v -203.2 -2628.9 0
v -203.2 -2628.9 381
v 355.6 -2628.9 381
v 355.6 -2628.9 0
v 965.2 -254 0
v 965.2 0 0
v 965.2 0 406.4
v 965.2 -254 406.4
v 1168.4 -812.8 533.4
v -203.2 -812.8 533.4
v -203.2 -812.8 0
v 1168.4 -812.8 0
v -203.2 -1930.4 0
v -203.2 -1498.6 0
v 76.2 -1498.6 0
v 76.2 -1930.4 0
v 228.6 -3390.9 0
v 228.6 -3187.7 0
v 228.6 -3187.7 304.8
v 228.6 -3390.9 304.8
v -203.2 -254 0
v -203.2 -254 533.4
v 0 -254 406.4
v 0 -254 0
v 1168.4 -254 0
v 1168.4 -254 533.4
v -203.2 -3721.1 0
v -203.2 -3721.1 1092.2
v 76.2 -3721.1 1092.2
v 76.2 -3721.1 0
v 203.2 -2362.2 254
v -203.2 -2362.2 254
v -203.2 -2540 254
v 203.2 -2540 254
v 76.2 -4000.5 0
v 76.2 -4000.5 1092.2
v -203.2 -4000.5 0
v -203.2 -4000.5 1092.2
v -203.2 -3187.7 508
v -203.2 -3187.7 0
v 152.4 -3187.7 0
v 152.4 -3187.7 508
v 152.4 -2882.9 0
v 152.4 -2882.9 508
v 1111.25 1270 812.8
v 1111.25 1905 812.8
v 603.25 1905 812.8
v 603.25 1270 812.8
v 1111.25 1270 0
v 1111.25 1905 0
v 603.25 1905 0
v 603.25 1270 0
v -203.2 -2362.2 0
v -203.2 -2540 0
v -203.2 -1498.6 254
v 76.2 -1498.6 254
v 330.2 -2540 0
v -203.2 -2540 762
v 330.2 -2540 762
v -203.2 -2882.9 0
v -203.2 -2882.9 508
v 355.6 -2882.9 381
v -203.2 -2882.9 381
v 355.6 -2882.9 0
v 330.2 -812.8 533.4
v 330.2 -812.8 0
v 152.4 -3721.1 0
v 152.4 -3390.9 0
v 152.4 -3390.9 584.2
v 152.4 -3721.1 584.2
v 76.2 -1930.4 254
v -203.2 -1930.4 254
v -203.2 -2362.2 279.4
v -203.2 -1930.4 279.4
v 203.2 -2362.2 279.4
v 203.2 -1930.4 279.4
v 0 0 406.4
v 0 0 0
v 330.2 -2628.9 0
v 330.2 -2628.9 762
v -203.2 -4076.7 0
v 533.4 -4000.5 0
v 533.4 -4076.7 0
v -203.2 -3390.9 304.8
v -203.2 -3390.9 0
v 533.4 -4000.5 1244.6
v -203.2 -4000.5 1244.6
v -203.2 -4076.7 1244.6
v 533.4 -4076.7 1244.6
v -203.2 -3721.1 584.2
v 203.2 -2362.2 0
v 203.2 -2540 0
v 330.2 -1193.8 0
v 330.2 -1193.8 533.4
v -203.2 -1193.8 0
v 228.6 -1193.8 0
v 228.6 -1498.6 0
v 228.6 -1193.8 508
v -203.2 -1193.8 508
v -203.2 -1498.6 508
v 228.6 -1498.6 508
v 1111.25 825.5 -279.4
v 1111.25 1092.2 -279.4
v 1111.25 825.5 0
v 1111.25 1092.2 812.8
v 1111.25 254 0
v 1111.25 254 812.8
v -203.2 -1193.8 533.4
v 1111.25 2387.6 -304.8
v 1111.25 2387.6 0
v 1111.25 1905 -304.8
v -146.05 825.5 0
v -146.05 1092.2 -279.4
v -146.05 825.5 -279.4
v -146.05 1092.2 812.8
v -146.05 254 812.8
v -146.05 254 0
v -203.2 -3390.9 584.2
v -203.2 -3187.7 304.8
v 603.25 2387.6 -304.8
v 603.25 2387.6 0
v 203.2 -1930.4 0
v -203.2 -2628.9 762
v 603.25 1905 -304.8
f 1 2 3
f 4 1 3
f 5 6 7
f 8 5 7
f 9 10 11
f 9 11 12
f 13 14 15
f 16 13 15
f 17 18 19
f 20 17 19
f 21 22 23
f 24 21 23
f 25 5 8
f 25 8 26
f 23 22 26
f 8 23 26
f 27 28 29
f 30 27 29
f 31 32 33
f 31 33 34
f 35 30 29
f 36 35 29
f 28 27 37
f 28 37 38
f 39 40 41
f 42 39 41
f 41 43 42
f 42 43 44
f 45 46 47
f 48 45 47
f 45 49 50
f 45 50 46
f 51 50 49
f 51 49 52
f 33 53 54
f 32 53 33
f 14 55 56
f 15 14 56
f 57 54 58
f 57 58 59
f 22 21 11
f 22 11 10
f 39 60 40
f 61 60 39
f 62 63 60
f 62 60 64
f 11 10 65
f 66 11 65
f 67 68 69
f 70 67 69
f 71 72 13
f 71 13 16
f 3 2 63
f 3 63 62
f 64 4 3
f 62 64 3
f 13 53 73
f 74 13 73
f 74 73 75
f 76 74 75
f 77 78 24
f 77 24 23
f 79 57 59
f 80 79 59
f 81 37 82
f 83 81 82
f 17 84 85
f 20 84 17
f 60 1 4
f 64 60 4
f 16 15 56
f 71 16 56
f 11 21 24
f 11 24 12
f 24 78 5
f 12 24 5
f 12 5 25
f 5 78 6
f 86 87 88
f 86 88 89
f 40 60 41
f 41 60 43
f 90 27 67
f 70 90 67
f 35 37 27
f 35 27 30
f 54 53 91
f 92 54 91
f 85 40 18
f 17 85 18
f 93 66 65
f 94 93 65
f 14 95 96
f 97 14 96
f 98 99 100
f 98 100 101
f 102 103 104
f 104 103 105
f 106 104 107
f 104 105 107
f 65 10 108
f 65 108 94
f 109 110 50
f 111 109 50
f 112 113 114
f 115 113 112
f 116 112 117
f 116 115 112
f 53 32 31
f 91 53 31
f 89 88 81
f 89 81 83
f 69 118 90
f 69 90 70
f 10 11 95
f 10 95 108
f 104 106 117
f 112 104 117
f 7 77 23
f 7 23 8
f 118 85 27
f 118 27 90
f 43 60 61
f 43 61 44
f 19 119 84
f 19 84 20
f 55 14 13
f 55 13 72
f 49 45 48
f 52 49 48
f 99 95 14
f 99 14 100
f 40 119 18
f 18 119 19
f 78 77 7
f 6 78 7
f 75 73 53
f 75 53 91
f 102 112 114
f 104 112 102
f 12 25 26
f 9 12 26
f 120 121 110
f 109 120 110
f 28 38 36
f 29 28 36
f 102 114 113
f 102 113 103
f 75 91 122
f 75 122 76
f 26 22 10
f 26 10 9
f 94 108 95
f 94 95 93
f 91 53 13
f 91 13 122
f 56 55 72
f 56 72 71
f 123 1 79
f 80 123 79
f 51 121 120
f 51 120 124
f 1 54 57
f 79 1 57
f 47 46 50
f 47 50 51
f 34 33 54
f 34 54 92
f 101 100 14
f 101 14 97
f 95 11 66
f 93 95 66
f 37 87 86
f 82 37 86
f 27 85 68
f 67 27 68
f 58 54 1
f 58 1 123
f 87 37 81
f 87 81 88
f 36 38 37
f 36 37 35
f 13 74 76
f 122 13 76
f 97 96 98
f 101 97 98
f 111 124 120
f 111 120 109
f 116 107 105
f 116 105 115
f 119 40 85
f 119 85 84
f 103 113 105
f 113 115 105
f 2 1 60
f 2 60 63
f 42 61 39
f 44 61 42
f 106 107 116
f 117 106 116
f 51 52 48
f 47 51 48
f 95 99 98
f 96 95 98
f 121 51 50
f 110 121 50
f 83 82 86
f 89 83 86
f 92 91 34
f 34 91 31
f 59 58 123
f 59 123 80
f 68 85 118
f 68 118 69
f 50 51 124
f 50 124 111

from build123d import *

# Parameters (mm, degrees)
F0_W      = 965.2
F0_H      = 406.4
F1_DEPTH  = 254
F2_W      = 1371.6
F2_H      = 533.4
F3_DEPTH  = 558.8
F5_W      = 1257.3
F5_H      = 812.8
F6_DEPTH  = 838.2
F7_W      = 1257.3
F7_H      = 266.7
F8_DEPTH  = 279.4
F10_W     = 508
F10_H     = 812.8
F11_DEPTH = 635
F12_W     = 508
F12_H     = 482.6
F13_DEPTH = 304.8
F14_W     = 533.4
F14_H     = 533.4
F15_DEPTH = 381
F16_W     = 431.8
F16_H     = 508
F17_DEPTH = 304.8
F18_W     = 279.4
F18_H     = 254
F19_DEPTH = 431.8
F20_W     = 406.4
F20_H     = 279.4
F21_DEPTH = 431.8
F22_W     = 406.4
F22_H     = 254
F23_DEPTH = 177.8
F24_W     = 533.4
F24_H     = 762
F25_DEPTH = 88.9
F26_W     = 558.8
F26_H     = 381
F27_DEPTH = 254
F28_W     = 355.6
F28_H     = 508
F29_DEPTH = 304.8
F30_W     = 431.8
F30_H     = 304.8
F31_DEPTH = 203.2
F32_W     = 355.6
F32_H     = 584.2
F33_DEPTH = 330.2
F34_W     = 279.4
F34_H     = 1092.2
F35_DEPTH = 279.4
F36_W     = 736.6
F36_H     = 1244.6
F37_DEPTH = 76.2


with BuildPart() as f1:
    # F0 (on Front) → F1 (new body)
    with BuildSketch(Plane.XZ):
        with Locations((482.6, 203.2)):
            Rectangle(F0_W, F0_H)
    extrude(amount=F1_DEPTH)

    # F2 (on face) → F3 (join)
    with BuildSketch(Plane.XZ.offset(254)):
        with Locations((482.6, 266.7)):
            Rectangle(F2_W, F2_H)
    extrude(amount=F3_DEPTH)


with BuildPart() as f6:
    # F5 (on offset) → F6 (new body)
    with BuildSketch(Plane(origin=(0, 254, 0), x_dir=(-1, 0, 0), z_dir=(0, 1, 0))):
        with Locations((-482.6, 406.4)):
            Rectangle(F5_W, F5_H)
    extrude(amount=F6_DEPTH)

    # F7 (on face) → F8 (join)
    with BuildSketch(Plane(origin=(0, 0, 0), x_dir=(1, 0, 0), z_dir=(0, 0, -1))):
        with Locations((482.6, -958.85)):
            Rectangle(F7_W, F7_H)
    extrude(amount=F8_DEPTH)


with BuildPart() as f11:
    # F10 (on offset) → F11 (new body)
    with BuildSketch(Plane(origin=(0, 1270, 0), x_dir=(-1, 0, 0), z_dir=(0, 1, 0))):
        with Locations((-857.25, 406.4)):
            Rectangle(F10_W, F10_H)
    extrude(amount=F11_DEPTH)


with BuildPart() as f13:
    # F12 (on face) → F13 (new body)
    with BuildSketch(Plane(origin=(0, 0, 0), x_dir=(1, 0, 0), z_dir=(0, 0, -1))):
        with Locations((857.25, -2146.3)):
            Rectangle(F12_W, F12_H)
    extrude(amount=F13_DEPTH)


with BuildPart() as f15:
    # F14 (on face) → F15 (new body)
    with BuildSketch(Plane.XZ.offset(812.8)):
        with Locations((63.5, 266.7)):
            Rectangle(F14_W, F14_H)
    extrude(amount=F15_DEPTH)


with BuildPart() as f17:
    # F16 (on face) → F17 (new body)
    with BuildSketch(Plane.XZ.offset(1193.8)):
        with Locations((12.7, 254)):
            Rectangle(F16_W, F16_H)
    extrude(amount=F17_DEPTH)


with BuildPart() as f19:
    # F18 (on face) → F19 (new body)
    with BuildSketch(Plane.XZ.offset(1498.6)):
        with Locations((-63.5, 127)):
            Rectangle(F18_W, F18_H)
    extrude(amount=F19_DEPTH)


with BuildPart() as f21:
    # F20 (on face) → F21 (new body)
    with BuildSketch(Plane.XZ.offset(1930.4)):
        with Locations((0, 139.7)):
            Rectangle(F20_W, F20_H)
    extrude(amount=F21_DEPTH)


with BuildPart() as f23:
    # F22 (on face) → F23 (new body)
    with BuildSketch(Plane.XZ.offset(2362.2)):
        with Locations((0, 127)):
            Rectangle(F22_W, F22_H)
    extrude(amount=F23_DEPTH)


with BuildPart() as f25:
    # F24 (on face) → F25 (new body)
    with BuildSketch(Plane.XZ.offset(2540)):
        with Locations((63.5, 381)):
            Rectangle(F24_W, F24_H)
    extrude(amount=F25_DEPTH)


with BuildPart() as f27:
    # F26 (on face) → F27 (new body)
    with BuildSketch(Plane.XZ.offset(2628.9)):
        with Locations((76.2, 190.5)):
            Rectangle(F26_W, F26_H)
    extrude(amount=F27_DEPTH)


with BuildPart() as f29:
    # F28 (on face) → F29 (new body)
    with BuildSketch(Plane.XZ.offset(2882.9)):
        with Locations((-25.4, 254)):
            Rectangle(F28_W, F28_H)
    extrude(amount=F29_DEPTH)


with BuildPart() as f31:
    # F30 (on face) → F31 (new body)
    with BuildSketch(Plane.XZ.offset(3187.7)):
        with Locations((12.7, 152.4)):
            Rectangle(F30_W, F30_H)
    extrude(amount=F31_DEPTH)


with BuildPart() as f33:
    # F32 (on face) → F33 (new body)
    with BuildSketch(Plane.XZ.offset(3390.9)):
        with Locations((-25.4, 292.1)):
            Rectangle(F32_W, F32_H)
    extrude(amount=F33_DEPTH)


with BuildPart() as f35:
    # F34 (on face) → F35 (new body)
    with BuildSketch(Plane.XZ.offset(3721.1)):
        with Locations((-63.5, 546.1)):
            Rectangle(F34_W, F34_H)
    extrude(amount=F35_DEPTH)


with BuildPart() as f37:
    # F36 (on face) → F37 (new body)
    with BuildSketch(Plane.XZ.offset(4000.5)):
        with Locations((165.1, 622.3)):
            Rectangle(F36_W, F36_H)
    extrude(amount=F37_DEPTH)


solid = Compound([f1.part, f6.part, f11.part, f13.part, f15.part, f17.part, f19.part, f21.part, f23.part, f25.part, f27.part, f29.part, f31.part, f33.part, f35.part, f37.part])
